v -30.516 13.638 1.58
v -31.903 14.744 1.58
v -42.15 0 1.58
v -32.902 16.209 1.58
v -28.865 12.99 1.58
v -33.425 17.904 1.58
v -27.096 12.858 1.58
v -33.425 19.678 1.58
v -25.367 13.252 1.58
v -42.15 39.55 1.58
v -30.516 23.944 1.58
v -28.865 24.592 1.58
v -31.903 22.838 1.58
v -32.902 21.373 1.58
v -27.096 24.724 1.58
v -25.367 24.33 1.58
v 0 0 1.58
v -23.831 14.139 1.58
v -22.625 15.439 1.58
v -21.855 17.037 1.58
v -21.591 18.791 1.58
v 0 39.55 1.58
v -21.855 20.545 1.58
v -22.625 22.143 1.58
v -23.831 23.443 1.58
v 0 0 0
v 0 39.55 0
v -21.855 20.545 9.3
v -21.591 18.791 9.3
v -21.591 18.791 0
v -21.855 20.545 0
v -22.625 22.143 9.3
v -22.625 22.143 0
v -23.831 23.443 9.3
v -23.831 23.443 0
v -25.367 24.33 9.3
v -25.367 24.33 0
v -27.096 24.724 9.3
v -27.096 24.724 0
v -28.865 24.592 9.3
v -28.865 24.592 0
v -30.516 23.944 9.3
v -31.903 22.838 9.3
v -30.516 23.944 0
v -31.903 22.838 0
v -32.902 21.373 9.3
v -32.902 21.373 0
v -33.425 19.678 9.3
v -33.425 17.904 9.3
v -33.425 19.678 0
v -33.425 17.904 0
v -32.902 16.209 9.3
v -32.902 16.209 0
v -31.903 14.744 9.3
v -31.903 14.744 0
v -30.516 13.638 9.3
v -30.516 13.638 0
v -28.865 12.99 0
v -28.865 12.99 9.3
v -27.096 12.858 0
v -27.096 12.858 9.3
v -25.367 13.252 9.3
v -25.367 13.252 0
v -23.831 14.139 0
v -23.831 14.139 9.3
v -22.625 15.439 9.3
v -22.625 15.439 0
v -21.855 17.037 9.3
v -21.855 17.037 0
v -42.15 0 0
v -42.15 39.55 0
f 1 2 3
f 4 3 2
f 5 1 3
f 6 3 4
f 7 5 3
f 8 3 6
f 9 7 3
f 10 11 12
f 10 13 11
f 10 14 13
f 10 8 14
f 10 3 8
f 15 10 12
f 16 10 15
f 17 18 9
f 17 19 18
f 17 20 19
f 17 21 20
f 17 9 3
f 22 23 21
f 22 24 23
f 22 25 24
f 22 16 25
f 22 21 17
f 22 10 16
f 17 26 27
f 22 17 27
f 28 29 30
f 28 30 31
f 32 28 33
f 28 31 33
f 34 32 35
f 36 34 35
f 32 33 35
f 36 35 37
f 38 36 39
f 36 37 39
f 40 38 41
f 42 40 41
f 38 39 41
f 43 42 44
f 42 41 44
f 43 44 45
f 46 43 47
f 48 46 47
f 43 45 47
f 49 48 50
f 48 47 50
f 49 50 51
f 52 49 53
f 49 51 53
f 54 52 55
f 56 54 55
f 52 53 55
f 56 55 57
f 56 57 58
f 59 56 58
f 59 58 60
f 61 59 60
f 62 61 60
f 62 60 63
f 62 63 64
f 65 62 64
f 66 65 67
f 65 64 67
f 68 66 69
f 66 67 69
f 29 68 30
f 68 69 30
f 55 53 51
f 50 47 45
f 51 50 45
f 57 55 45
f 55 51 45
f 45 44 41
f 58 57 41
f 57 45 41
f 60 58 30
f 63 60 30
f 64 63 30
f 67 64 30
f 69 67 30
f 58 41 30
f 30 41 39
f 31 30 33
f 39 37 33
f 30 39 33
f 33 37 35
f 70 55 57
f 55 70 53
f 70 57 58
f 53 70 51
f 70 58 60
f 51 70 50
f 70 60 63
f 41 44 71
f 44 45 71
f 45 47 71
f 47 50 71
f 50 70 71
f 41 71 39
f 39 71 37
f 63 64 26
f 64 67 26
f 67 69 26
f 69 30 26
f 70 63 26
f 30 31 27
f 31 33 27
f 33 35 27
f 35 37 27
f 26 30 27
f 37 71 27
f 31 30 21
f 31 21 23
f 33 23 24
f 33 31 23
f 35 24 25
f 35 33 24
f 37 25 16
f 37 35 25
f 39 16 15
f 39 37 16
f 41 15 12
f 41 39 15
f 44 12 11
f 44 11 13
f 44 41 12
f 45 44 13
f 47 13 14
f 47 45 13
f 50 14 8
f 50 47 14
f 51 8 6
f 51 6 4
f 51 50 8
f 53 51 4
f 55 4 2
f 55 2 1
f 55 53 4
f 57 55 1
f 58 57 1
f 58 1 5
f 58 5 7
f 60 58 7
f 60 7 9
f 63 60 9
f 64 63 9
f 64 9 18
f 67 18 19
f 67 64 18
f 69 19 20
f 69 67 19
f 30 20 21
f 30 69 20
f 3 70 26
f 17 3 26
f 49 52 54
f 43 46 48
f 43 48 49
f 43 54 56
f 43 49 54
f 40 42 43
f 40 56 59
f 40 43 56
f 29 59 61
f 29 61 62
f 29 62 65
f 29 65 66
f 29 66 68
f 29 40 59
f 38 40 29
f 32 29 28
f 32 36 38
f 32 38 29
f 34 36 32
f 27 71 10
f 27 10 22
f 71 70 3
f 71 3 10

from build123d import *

# Parameters (mm, degrees)
F0_R     = 5.95
F1_DEPTH = 9.3
F0_W     = 42.15
F0_H     = 39.55
F2_DEPTH = 1.58


with BuildPart() as f1:
    # F0 (on Top) → F1 (new body)
    with BuildSketch(Plane.XY):
        with Locations((-27.540984, 18.790985)):
            Circle(F0_R)
    extrude(amount=F1_DEPTH)


with BuildPart() as f2:
    # F0 (on Top) → F2 (new body)
    with BuildSketch(Plane.XY):
        with Locations((-21.075, 19.775)):
            Rectangle(F0_W, F0_H)
        with Locations((-27.540984, 18.790985)):
            Circle(F0_R, mode=Mode.SUBTRACT)
    extrude(amount=F2_DEPTH)


solid = Compound([f1.part, f2.part])
